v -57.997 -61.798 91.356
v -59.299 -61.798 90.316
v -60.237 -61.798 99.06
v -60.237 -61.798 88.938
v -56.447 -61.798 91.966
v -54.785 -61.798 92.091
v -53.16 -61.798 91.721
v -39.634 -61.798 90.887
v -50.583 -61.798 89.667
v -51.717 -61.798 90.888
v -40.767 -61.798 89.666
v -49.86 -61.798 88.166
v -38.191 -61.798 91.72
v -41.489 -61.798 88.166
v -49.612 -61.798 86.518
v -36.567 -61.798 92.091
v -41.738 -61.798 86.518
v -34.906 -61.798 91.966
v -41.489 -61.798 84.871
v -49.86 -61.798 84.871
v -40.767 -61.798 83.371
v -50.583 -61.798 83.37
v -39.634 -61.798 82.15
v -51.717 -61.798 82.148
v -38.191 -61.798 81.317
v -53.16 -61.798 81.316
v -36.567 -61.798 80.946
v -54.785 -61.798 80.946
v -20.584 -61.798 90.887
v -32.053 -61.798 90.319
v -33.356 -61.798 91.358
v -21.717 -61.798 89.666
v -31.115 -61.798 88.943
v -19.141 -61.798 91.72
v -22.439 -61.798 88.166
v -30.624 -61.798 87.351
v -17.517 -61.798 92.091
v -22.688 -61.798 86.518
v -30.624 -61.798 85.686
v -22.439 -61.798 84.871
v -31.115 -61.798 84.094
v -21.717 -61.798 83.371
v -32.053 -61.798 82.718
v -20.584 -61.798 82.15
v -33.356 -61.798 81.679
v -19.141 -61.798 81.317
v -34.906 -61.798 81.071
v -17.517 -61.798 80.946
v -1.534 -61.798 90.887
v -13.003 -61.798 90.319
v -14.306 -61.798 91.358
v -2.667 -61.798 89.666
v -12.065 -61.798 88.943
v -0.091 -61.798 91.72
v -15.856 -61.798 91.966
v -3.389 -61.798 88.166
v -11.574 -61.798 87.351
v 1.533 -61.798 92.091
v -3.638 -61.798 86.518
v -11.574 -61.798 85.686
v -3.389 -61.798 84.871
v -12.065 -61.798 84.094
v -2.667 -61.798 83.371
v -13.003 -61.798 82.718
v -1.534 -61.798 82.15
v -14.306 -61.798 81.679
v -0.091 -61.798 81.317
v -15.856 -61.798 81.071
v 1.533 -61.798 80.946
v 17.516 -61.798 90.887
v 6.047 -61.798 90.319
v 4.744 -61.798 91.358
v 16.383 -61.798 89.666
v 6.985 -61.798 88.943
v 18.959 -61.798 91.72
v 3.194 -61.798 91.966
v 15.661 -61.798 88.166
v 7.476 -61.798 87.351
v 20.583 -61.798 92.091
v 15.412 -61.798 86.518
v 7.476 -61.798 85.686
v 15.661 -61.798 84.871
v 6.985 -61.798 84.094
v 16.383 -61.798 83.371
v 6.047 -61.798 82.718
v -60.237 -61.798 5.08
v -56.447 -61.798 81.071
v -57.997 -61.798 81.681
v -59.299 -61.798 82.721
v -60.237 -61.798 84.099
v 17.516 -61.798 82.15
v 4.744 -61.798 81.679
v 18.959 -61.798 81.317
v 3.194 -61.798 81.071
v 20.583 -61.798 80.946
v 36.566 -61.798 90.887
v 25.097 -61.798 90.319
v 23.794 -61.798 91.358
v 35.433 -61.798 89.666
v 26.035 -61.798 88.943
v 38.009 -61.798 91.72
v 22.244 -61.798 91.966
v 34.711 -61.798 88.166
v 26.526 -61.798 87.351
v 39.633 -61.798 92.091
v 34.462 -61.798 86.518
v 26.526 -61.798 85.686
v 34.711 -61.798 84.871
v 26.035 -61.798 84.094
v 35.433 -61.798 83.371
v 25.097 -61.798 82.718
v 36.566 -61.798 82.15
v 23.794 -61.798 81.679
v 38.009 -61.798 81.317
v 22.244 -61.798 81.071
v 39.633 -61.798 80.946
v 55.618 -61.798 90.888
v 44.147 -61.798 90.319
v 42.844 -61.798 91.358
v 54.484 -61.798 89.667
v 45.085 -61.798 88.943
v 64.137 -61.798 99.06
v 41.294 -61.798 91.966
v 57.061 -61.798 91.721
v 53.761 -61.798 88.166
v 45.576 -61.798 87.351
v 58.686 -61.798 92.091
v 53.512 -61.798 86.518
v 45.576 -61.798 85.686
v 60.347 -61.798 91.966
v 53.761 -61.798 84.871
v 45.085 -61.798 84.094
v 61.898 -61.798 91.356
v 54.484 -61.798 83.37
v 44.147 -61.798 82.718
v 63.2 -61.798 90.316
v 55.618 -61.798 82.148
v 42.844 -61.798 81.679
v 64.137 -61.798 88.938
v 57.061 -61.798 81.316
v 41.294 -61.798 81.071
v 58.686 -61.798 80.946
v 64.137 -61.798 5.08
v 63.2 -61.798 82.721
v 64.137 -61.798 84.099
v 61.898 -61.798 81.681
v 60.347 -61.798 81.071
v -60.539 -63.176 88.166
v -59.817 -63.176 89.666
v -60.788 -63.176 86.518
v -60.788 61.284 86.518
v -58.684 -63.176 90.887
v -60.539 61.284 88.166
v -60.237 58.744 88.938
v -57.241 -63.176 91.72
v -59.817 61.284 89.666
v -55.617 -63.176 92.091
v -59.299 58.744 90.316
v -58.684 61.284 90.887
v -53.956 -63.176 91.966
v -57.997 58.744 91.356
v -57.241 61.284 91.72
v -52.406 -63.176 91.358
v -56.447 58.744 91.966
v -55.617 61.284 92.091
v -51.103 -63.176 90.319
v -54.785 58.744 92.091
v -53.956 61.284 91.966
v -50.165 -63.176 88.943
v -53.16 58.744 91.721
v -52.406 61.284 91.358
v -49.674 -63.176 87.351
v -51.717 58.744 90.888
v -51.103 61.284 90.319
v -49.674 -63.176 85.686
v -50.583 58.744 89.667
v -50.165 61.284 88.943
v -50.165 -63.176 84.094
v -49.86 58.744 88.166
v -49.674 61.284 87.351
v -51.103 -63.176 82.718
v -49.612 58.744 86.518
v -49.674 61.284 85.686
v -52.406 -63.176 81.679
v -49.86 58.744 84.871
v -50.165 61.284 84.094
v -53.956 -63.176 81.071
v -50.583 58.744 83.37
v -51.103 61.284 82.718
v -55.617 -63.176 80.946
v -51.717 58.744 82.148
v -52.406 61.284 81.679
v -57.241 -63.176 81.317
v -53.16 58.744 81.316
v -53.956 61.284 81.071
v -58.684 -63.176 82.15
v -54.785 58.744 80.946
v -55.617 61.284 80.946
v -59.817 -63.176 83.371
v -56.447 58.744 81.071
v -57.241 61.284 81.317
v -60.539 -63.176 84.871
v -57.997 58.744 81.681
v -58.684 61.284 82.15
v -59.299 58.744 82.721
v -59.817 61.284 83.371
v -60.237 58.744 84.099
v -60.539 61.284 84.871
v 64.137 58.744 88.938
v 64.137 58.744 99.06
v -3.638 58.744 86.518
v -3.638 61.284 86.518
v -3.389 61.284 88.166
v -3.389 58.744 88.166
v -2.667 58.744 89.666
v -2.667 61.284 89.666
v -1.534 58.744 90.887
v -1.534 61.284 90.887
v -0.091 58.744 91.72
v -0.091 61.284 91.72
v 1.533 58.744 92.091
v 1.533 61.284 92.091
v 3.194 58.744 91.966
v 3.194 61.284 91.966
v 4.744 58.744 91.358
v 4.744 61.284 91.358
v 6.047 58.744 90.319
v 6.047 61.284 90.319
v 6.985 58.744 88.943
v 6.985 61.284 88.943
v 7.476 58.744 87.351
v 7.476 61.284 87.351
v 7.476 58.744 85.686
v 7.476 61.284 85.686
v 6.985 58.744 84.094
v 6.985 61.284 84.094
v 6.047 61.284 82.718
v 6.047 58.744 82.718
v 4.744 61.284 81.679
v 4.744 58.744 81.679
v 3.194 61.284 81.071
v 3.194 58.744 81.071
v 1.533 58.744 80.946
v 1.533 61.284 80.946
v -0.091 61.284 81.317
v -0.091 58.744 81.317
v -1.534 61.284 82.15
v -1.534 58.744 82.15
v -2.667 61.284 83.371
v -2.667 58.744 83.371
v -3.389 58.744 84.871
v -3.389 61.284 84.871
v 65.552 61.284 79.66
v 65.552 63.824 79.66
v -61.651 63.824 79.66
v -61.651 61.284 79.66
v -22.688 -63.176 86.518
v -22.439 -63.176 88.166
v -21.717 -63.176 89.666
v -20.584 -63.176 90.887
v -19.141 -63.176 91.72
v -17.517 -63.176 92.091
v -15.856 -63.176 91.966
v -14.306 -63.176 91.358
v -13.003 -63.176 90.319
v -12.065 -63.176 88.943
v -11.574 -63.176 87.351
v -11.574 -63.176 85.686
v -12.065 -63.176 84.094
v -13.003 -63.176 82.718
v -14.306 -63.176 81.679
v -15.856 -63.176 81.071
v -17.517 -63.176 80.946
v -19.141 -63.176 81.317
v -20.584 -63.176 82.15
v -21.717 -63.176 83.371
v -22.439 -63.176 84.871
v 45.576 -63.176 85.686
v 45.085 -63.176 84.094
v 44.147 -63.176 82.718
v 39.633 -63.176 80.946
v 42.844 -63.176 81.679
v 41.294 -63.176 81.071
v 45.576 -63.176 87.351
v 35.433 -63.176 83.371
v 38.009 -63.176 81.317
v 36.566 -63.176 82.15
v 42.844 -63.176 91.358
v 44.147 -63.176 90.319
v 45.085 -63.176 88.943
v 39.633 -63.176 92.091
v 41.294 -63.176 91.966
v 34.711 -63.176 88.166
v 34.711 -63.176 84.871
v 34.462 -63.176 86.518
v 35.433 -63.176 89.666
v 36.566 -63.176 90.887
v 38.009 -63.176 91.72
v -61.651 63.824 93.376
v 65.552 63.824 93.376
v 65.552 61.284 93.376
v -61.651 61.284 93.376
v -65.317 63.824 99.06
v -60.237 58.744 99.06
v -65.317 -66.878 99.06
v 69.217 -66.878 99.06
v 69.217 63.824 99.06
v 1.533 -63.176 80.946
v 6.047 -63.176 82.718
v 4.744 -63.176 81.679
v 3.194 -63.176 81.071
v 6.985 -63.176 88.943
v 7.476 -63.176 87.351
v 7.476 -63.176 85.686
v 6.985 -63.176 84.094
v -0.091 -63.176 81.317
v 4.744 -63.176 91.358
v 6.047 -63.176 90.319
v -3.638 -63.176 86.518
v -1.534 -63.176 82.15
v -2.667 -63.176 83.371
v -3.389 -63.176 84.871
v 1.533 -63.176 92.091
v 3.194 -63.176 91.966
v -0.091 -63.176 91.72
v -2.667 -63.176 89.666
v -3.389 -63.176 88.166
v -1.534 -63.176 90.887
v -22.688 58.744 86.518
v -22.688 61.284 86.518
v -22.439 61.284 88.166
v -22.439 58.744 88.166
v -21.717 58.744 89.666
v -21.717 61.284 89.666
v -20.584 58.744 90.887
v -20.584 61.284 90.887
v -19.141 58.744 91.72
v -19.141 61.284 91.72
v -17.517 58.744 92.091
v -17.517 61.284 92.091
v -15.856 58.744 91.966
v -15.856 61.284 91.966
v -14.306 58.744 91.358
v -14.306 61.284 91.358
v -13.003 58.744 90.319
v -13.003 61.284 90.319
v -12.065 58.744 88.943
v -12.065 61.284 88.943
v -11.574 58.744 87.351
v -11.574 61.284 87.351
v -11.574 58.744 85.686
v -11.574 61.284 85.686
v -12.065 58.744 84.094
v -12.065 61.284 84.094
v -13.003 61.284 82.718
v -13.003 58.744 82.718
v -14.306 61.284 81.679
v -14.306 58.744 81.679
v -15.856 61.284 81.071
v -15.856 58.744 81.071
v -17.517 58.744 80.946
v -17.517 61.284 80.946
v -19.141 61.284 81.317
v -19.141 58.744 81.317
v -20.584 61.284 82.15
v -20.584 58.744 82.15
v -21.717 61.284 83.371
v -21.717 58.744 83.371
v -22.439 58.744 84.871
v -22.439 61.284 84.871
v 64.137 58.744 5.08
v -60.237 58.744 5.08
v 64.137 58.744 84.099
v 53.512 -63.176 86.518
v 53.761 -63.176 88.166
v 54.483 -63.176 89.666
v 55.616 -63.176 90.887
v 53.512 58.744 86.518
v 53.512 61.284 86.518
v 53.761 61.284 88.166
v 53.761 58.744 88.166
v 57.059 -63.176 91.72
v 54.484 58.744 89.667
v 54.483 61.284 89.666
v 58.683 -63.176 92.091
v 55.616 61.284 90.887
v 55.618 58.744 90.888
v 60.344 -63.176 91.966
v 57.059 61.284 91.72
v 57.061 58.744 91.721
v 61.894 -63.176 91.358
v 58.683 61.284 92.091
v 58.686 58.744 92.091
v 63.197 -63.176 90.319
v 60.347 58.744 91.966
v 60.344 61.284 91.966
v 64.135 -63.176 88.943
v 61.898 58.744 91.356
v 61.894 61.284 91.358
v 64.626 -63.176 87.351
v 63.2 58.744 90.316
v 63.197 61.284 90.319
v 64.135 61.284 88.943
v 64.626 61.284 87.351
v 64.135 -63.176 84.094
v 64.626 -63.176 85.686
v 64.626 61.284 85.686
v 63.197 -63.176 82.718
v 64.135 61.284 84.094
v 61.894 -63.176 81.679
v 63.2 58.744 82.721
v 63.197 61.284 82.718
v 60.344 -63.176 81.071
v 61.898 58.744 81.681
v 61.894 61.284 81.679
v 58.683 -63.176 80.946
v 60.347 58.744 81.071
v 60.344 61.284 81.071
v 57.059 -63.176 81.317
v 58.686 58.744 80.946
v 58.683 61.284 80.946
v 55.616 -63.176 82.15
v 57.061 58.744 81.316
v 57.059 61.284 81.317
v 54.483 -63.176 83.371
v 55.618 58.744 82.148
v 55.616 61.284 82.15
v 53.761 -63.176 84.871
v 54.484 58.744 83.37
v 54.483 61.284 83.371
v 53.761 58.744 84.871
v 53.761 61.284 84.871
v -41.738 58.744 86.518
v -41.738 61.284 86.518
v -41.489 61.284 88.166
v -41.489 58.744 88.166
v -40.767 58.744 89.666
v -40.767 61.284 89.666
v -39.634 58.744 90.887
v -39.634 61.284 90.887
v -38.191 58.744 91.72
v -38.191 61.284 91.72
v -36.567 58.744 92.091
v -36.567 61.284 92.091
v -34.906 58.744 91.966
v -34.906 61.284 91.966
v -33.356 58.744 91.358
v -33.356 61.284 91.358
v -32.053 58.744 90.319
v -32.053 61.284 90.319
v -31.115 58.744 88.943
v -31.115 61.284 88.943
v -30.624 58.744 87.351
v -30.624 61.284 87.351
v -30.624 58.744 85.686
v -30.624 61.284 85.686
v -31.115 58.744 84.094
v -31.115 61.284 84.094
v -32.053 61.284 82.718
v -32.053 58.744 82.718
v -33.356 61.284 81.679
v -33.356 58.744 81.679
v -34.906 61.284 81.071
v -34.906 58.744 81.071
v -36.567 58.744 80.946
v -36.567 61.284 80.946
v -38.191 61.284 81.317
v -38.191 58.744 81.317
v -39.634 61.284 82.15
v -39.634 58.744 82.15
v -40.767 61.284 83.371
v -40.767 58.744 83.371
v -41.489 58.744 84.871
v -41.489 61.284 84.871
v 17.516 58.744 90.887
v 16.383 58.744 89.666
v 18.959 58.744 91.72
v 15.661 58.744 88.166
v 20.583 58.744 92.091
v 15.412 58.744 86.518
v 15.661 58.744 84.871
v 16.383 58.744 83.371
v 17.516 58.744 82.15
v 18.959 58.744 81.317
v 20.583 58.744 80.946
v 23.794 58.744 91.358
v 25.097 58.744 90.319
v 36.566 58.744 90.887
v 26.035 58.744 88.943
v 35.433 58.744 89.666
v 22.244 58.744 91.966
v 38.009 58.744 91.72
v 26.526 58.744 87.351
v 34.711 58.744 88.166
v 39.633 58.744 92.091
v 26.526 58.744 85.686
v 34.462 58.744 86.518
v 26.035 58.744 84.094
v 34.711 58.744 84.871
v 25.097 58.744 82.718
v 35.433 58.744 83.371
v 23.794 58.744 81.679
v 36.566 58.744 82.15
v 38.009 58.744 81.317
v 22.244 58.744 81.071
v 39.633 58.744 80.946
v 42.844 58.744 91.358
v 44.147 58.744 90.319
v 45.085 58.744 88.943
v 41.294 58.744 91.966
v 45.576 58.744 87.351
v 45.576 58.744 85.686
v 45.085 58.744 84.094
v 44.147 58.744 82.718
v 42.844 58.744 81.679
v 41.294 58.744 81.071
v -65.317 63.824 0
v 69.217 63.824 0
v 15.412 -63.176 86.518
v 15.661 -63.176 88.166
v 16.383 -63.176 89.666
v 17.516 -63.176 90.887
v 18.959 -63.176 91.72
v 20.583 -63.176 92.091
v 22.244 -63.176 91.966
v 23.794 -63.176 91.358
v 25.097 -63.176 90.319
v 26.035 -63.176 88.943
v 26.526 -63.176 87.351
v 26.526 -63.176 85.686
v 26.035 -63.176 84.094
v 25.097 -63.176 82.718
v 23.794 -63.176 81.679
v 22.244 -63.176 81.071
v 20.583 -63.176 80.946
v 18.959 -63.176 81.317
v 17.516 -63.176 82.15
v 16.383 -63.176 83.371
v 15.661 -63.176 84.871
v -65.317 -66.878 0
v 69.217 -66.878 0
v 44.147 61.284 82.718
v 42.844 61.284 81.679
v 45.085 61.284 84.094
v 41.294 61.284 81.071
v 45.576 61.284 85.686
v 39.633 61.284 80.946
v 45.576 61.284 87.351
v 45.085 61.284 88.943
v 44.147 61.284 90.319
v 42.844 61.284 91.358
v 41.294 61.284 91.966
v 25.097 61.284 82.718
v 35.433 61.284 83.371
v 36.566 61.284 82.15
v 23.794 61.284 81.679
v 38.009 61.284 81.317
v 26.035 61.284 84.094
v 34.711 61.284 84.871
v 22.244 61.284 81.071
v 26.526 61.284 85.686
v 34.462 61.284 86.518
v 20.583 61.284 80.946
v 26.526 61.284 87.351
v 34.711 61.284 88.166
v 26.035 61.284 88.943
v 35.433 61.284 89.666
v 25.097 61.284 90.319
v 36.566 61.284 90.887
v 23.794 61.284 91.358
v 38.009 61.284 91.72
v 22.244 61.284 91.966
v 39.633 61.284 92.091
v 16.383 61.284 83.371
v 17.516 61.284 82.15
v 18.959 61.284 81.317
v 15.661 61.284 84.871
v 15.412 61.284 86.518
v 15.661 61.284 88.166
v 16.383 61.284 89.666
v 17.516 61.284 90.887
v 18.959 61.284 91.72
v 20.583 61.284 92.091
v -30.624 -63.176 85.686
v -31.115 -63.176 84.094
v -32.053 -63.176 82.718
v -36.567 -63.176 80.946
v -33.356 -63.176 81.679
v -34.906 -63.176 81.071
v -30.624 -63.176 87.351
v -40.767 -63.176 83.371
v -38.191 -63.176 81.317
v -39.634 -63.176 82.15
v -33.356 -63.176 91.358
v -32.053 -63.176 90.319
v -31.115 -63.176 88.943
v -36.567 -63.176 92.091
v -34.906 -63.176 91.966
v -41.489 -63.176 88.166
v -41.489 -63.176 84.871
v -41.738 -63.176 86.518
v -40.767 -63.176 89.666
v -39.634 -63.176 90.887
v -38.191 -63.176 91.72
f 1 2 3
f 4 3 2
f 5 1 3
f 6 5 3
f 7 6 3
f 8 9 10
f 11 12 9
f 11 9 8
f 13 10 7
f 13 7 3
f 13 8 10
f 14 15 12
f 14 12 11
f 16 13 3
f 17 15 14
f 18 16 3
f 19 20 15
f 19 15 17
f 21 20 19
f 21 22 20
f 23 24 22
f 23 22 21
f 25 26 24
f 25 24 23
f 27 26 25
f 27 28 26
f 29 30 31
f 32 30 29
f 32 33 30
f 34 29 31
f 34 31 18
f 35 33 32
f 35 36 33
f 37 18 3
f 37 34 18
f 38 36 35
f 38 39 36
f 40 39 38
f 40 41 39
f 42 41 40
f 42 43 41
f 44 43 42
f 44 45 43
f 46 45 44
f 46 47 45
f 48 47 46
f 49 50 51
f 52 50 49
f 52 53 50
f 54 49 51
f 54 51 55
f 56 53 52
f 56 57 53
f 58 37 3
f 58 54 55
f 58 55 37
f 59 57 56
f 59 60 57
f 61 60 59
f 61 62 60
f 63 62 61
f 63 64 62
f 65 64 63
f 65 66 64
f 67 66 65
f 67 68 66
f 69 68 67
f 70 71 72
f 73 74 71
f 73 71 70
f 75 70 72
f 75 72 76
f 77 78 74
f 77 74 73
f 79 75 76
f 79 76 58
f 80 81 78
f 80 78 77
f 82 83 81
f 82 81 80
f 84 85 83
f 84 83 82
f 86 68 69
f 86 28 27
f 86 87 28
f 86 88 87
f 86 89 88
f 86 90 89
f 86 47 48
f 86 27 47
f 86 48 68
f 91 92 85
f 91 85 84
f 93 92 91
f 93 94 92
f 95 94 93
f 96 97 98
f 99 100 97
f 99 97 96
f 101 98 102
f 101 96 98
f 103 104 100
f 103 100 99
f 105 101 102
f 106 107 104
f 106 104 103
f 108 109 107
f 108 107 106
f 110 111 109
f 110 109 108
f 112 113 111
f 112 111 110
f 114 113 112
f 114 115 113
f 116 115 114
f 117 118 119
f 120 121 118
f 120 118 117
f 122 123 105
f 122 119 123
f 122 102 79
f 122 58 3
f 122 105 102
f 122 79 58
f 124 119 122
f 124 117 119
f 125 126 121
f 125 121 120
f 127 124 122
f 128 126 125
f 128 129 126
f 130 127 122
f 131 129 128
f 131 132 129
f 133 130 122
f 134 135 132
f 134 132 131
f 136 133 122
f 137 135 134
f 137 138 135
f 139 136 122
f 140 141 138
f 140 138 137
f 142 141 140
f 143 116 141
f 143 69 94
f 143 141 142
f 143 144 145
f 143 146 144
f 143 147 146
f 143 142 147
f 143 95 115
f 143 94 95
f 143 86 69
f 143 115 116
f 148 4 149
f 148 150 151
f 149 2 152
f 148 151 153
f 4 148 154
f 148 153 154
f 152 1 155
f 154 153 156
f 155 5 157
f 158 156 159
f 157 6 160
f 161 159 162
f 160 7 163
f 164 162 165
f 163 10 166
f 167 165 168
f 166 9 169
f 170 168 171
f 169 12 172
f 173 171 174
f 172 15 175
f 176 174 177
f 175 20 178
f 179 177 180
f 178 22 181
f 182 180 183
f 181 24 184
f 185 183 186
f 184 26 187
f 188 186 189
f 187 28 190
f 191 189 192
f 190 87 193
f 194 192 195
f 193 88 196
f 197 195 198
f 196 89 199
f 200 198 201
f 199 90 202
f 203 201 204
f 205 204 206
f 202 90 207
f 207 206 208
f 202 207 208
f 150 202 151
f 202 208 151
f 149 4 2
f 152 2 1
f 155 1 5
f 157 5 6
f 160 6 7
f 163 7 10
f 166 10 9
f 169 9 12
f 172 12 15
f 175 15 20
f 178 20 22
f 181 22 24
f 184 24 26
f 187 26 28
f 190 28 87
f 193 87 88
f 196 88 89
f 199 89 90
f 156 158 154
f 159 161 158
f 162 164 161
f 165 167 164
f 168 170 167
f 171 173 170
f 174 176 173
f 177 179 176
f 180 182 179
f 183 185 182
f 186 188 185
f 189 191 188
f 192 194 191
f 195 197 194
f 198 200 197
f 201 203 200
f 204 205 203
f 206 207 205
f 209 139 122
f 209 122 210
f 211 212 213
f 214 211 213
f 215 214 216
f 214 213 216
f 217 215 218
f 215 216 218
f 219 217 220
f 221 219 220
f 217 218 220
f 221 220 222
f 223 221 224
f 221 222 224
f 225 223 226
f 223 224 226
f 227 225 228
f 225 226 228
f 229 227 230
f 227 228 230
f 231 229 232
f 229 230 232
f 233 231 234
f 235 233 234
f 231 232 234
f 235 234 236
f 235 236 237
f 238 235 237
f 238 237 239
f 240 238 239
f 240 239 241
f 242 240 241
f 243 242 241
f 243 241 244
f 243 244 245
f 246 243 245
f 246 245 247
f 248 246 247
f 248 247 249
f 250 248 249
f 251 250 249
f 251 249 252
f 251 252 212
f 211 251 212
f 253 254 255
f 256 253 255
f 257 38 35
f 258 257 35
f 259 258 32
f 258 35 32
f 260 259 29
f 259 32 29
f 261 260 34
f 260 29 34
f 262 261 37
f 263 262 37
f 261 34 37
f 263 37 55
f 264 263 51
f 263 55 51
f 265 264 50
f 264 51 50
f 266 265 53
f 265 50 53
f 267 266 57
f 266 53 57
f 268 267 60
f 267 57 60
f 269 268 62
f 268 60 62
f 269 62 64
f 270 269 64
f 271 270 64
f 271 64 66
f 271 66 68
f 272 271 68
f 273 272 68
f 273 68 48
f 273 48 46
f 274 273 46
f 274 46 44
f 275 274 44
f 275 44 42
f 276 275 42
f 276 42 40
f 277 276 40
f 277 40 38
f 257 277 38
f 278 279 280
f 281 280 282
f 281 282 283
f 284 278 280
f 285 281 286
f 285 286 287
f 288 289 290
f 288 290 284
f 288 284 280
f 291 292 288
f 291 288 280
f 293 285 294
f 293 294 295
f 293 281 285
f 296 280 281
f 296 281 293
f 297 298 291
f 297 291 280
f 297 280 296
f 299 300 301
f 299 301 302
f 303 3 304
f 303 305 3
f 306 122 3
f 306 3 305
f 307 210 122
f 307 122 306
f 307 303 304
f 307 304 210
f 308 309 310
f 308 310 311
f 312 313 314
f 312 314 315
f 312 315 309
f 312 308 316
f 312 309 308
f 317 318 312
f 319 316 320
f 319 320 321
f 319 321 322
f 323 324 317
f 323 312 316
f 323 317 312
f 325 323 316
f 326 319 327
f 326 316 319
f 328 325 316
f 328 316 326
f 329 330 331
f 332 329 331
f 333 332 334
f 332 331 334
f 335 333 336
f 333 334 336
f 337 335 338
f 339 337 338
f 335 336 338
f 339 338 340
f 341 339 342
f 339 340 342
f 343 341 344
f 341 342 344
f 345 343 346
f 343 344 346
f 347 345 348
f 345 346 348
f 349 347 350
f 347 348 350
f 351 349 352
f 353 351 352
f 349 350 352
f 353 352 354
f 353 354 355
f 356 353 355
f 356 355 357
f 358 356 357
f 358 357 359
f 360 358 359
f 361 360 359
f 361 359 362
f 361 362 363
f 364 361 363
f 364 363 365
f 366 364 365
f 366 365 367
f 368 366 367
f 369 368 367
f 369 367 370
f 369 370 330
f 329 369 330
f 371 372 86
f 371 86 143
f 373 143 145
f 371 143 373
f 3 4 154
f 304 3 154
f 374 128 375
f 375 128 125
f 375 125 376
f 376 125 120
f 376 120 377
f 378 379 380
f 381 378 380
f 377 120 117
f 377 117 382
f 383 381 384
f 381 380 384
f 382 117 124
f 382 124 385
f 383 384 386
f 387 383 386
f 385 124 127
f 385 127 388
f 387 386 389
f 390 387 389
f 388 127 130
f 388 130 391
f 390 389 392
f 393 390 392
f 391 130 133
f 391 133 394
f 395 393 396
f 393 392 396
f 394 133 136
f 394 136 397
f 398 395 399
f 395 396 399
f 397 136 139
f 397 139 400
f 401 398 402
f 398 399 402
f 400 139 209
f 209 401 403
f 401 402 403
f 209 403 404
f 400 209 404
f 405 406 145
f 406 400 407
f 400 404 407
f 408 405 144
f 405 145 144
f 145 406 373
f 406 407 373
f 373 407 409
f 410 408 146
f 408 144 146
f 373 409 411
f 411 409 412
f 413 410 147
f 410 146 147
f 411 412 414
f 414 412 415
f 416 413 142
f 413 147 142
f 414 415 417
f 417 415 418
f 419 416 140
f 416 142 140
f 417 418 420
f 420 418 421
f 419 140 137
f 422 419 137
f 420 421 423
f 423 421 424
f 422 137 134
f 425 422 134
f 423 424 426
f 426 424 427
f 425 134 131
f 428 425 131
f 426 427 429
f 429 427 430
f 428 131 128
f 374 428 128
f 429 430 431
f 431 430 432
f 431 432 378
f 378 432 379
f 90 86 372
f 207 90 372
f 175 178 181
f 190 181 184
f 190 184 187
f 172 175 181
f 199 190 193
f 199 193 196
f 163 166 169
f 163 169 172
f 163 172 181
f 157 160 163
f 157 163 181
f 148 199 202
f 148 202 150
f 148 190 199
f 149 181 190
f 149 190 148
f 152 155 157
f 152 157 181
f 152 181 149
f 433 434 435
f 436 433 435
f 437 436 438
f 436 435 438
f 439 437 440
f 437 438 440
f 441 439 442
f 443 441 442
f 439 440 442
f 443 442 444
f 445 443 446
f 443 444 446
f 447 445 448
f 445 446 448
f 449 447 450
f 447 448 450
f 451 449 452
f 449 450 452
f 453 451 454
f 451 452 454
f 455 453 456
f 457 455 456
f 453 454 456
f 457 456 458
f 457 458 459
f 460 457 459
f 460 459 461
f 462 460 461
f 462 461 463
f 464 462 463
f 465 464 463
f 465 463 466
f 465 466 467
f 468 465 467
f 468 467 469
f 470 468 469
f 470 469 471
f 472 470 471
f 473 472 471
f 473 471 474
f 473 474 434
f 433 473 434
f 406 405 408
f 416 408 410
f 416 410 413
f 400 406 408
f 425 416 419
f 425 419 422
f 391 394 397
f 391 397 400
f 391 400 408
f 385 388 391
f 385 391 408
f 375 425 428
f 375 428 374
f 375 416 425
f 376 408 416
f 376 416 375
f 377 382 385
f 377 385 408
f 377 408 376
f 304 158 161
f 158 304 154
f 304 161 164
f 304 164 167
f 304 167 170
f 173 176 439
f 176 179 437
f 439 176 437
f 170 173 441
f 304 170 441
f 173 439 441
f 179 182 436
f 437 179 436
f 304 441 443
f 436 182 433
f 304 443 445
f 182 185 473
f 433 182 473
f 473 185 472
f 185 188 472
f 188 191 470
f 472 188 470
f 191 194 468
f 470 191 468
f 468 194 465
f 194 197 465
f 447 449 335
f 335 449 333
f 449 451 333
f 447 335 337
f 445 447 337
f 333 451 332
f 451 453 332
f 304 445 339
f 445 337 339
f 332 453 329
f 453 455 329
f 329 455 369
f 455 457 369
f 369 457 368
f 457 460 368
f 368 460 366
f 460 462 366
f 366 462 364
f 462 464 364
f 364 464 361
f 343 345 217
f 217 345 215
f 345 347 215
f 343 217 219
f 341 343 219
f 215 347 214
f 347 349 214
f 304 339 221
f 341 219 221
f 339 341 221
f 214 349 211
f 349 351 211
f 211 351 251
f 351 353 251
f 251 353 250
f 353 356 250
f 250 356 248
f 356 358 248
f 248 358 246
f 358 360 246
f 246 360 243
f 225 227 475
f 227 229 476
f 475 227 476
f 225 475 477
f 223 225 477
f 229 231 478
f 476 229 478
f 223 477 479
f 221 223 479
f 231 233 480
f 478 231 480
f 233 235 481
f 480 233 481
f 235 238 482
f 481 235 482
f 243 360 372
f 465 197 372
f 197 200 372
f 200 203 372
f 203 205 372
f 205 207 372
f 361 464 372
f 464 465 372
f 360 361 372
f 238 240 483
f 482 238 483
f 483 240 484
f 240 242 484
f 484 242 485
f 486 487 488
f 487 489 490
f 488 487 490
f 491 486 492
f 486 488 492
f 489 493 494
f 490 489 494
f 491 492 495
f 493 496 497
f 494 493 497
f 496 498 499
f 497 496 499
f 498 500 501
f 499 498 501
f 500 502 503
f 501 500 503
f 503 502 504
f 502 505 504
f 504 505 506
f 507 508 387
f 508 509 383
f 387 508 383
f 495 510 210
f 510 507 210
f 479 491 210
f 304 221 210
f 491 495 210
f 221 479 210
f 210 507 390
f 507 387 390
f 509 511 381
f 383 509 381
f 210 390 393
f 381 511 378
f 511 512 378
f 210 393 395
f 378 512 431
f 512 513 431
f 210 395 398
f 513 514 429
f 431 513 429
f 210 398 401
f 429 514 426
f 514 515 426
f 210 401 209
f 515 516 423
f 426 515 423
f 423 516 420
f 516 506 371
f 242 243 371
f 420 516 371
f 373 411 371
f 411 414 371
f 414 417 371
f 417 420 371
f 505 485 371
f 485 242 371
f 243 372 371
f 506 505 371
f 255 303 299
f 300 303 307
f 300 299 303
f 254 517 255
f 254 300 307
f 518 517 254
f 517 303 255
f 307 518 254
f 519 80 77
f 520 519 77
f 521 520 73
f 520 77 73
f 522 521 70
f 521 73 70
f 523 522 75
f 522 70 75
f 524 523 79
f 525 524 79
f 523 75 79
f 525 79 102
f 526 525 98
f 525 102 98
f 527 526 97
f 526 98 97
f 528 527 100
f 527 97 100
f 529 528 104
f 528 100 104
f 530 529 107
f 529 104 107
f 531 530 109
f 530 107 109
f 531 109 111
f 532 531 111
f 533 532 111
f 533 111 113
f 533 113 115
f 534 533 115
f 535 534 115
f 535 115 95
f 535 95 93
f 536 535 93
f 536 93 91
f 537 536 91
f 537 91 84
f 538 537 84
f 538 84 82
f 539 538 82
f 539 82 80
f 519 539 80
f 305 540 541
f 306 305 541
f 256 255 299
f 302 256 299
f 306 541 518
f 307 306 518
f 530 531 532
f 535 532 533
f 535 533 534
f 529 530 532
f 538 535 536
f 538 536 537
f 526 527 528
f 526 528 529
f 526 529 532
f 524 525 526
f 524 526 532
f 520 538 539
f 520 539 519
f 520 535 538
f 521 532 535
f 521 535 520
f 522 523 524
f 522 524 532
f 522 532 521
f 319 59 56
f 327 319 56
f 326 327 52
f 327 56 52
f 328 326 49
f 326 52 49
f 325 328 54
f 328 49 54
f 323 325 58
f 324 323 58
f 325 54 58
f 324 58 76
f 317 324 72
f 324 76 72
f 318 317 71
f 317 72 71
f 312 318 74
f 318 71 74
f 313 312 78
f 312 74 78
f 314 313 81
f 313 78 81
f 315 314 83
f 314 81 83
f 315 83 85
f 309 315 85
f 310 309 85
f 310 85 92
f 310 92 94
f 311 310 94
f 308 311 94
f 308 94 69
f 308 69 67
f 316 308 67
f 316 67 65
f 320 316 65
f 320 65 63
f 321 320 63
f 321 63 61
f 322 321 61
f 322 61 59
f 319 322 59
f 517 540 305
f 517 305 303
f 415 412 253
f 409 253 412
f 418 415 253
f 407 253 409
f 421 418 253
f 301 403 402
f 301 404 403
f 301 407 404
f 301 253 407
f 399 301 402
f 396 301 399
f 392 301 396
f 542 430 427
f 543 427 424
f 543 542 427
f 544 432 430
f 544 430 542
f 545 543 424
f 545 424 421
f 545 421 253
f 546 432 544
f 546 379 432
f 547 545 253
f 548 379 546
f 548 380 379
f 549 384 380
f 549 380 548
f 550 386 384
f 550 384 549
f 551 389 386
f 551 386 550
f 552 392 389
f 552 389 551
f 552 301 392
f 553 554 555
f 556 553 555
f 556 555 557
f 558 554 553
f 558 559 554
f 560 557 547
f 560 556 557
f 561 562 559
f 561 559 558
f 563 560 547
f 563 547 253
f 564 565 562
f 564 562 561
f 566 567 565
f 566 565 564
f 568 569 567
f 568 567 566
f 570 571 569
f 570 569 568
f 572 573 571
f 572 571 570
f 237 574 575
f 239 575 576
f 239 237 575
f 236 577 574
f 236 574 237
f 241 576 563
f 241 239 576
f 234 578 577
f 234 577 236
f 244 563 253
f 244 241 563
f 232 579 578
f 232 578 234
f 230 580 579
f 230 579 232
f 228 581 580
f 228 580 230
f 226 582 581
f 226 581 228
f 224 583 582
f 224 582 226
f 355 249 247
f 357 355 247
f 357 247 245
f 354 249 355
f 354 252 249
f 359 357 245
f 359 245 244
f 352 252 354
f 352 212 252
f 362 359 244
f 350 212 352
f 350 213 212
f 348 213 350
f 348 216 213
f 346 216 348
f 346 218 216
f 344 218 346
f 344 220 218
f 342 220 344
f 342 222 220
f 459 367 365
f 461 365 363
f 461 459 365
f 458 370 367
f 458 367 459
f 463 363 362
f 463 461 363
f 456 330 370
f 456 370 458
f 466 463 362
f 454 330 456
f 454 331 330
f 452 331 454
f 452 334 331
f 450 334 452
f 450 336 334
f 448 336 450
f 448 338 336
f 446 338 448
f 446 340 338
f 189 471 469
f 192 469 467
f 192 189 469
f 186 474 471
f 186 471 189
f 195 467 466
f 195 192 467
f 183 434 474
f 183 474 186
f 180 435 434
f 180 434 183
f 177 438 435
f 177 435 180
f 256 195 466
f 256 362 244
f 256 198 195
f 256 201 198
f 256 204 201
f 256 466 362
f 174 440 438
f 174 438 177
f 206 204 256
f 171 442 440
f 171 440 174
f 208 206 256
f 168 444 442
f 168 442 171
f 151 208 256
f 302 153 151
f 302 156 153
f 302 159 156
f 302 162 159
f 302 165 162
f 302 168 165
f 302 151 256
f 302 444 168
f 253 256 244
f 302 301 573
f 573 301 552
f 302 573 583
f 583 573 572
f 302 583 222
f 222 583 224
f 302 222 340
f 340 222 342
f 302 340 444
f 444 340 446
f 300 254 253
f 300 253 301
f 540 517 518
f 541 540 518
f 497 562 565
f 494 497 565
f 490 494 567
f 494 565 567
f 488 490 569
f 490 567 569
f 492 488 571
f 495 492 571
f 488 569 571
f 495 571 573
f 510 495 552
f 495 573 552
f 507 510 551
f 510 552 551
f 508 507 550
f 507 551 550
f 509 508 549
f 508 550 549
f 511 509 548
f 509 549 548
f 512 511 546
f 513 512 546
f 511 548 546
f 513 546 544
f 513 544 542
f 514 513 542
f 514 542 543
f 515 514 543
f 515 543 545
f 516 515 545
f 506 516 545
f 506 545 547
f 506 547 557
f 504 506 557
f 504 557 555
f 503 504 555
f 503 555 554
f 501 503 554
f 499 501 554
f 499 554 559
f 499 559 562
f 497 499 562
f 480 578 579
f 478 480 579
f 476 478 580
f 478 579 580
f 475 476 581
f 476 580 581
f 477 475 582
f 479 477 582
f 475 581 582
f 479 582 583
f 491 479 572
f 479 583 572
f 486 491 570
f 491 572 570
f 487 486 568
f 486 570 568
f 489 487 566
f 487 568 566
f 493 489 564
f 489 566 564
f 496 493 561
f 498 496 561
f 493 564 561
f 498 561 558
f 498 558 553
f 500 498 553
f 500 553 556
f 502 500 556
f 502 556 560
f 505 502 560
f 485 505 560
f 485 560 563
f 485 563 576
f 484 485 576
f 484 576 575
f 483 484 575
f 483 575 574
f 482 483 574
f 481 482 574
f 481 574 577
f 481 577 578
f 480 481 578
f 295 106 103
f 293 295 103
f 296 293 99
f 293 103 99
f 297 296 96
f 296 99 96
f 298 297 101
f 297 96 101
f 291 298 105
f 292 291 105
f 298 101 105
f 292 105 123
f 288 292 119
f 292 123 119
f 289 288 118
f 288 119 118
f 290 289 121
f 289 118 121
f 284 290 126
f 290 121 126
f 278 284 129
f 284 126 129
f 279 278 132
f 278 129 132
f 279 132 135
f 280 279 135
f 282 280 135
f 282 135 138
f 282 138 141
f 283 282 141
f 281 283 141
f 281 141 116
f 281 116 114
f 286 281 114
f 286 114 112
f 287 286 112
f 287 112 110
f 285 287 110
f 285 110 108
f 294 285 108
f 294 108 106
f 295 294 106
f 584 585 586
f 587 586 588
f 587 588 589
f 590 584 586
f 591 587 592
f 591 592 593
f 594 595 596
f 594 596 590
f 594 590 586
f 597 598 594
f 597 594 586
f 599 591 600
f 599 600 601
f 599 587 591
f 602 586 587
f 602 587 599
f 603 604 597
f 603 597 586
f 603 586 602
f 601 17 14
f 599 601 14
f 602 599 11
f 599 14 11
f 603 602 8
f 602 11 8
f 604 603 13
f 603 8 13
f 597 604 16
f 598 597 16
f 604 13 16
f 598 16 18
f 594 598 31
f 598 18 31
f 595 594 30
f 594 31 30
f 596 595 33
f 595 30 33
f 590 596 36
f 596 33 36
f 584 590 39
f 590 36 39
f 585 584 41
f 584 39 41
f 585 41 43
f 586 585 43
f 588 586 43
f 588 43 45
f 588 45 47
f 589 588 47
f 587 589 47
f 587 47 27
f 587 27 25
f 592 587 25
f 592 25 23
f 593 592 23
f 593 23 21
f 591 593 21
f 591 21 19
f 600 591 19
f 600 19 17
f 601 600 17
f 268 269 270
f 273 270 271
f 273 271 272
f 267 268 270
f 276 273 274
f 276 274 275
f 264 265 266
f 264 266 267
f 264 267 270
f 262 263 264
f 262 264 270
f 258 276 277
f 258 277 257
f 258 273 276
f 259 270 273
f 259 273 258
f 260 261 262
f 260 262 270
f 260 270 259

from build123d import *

# Parameters (mm, degrees)
F0_W     = 134.533889
F0_H     = 130.701862
F1_DEPTH = 99.06
F2_T     = -5.08
F3_R     = 5.588
F4_DEPTH = 127
F5_W     = 127.2032
F5_H     = 13.716
F5_R     = 5.588
F6_DEPTH = 2.54


with BuildPart() as f1:
    # F0 (on Top) → F1 (new body)
    with BuildSketch(Plane.XY):
        with Locations((1.950313, -1.526598)):
            Rectangle(F0_W, F0_H)
    extrude(amount=F1_DEPTH)

    # F2
    f2_openings = [f1.faces().sort_by_distance(p)[0] for p in [
        (1.950312, -1.526598, 99.06),
    ]]
    offset(amount=F2_T, openings=f2_openings)

    # F3 (on face) → F4 (cut)
    with BuildSketch(Plane(origin=(0, 63.824333, 0), x_dir=(-1, 0, 0), z_dir=(0, 1, 0))):
        with Locations((-1.950312, 86.518437)):
            Circle(F3_R)
        with Locations((-21.000312, 86.518437)):
            Circle(F3_R)
        with Locations((-40.050312, 86.518437)):
            Circle(F3_R)
        with Locations((-59.100312, 86.518437)):
            Circle(F3_R)
        with Locations((17.099688, 86.518437)):
            Circle(F3_R)
        with Locations((36.149688, 86.518437)):
            Circle(F3_R)
        with Locations((55.199688, 86.518437)):
            Circle(F3_R)
    extrude(amount=-F4_DEPTH, mode=Mode.SUBTRACT)

    # F5 (on face) → F6 (cut)
    with BuildSketch(Plane(origin=(0, 63.824333, 0), x_dir=(-1, 0, 0), z_dir=(0, 1, 0))):
        with Locations((-1.950312, 86.518437)):
            Rectangle(F5_W, F5_H)
        with Locations((-1.950312, 86.518437)):
            Circle(F5_R, mode=Mode.SUBTRACT)
    extrude(amount=-F6_DEPTH, mode=Mode.SUBTRACT)


solid = f1.part
